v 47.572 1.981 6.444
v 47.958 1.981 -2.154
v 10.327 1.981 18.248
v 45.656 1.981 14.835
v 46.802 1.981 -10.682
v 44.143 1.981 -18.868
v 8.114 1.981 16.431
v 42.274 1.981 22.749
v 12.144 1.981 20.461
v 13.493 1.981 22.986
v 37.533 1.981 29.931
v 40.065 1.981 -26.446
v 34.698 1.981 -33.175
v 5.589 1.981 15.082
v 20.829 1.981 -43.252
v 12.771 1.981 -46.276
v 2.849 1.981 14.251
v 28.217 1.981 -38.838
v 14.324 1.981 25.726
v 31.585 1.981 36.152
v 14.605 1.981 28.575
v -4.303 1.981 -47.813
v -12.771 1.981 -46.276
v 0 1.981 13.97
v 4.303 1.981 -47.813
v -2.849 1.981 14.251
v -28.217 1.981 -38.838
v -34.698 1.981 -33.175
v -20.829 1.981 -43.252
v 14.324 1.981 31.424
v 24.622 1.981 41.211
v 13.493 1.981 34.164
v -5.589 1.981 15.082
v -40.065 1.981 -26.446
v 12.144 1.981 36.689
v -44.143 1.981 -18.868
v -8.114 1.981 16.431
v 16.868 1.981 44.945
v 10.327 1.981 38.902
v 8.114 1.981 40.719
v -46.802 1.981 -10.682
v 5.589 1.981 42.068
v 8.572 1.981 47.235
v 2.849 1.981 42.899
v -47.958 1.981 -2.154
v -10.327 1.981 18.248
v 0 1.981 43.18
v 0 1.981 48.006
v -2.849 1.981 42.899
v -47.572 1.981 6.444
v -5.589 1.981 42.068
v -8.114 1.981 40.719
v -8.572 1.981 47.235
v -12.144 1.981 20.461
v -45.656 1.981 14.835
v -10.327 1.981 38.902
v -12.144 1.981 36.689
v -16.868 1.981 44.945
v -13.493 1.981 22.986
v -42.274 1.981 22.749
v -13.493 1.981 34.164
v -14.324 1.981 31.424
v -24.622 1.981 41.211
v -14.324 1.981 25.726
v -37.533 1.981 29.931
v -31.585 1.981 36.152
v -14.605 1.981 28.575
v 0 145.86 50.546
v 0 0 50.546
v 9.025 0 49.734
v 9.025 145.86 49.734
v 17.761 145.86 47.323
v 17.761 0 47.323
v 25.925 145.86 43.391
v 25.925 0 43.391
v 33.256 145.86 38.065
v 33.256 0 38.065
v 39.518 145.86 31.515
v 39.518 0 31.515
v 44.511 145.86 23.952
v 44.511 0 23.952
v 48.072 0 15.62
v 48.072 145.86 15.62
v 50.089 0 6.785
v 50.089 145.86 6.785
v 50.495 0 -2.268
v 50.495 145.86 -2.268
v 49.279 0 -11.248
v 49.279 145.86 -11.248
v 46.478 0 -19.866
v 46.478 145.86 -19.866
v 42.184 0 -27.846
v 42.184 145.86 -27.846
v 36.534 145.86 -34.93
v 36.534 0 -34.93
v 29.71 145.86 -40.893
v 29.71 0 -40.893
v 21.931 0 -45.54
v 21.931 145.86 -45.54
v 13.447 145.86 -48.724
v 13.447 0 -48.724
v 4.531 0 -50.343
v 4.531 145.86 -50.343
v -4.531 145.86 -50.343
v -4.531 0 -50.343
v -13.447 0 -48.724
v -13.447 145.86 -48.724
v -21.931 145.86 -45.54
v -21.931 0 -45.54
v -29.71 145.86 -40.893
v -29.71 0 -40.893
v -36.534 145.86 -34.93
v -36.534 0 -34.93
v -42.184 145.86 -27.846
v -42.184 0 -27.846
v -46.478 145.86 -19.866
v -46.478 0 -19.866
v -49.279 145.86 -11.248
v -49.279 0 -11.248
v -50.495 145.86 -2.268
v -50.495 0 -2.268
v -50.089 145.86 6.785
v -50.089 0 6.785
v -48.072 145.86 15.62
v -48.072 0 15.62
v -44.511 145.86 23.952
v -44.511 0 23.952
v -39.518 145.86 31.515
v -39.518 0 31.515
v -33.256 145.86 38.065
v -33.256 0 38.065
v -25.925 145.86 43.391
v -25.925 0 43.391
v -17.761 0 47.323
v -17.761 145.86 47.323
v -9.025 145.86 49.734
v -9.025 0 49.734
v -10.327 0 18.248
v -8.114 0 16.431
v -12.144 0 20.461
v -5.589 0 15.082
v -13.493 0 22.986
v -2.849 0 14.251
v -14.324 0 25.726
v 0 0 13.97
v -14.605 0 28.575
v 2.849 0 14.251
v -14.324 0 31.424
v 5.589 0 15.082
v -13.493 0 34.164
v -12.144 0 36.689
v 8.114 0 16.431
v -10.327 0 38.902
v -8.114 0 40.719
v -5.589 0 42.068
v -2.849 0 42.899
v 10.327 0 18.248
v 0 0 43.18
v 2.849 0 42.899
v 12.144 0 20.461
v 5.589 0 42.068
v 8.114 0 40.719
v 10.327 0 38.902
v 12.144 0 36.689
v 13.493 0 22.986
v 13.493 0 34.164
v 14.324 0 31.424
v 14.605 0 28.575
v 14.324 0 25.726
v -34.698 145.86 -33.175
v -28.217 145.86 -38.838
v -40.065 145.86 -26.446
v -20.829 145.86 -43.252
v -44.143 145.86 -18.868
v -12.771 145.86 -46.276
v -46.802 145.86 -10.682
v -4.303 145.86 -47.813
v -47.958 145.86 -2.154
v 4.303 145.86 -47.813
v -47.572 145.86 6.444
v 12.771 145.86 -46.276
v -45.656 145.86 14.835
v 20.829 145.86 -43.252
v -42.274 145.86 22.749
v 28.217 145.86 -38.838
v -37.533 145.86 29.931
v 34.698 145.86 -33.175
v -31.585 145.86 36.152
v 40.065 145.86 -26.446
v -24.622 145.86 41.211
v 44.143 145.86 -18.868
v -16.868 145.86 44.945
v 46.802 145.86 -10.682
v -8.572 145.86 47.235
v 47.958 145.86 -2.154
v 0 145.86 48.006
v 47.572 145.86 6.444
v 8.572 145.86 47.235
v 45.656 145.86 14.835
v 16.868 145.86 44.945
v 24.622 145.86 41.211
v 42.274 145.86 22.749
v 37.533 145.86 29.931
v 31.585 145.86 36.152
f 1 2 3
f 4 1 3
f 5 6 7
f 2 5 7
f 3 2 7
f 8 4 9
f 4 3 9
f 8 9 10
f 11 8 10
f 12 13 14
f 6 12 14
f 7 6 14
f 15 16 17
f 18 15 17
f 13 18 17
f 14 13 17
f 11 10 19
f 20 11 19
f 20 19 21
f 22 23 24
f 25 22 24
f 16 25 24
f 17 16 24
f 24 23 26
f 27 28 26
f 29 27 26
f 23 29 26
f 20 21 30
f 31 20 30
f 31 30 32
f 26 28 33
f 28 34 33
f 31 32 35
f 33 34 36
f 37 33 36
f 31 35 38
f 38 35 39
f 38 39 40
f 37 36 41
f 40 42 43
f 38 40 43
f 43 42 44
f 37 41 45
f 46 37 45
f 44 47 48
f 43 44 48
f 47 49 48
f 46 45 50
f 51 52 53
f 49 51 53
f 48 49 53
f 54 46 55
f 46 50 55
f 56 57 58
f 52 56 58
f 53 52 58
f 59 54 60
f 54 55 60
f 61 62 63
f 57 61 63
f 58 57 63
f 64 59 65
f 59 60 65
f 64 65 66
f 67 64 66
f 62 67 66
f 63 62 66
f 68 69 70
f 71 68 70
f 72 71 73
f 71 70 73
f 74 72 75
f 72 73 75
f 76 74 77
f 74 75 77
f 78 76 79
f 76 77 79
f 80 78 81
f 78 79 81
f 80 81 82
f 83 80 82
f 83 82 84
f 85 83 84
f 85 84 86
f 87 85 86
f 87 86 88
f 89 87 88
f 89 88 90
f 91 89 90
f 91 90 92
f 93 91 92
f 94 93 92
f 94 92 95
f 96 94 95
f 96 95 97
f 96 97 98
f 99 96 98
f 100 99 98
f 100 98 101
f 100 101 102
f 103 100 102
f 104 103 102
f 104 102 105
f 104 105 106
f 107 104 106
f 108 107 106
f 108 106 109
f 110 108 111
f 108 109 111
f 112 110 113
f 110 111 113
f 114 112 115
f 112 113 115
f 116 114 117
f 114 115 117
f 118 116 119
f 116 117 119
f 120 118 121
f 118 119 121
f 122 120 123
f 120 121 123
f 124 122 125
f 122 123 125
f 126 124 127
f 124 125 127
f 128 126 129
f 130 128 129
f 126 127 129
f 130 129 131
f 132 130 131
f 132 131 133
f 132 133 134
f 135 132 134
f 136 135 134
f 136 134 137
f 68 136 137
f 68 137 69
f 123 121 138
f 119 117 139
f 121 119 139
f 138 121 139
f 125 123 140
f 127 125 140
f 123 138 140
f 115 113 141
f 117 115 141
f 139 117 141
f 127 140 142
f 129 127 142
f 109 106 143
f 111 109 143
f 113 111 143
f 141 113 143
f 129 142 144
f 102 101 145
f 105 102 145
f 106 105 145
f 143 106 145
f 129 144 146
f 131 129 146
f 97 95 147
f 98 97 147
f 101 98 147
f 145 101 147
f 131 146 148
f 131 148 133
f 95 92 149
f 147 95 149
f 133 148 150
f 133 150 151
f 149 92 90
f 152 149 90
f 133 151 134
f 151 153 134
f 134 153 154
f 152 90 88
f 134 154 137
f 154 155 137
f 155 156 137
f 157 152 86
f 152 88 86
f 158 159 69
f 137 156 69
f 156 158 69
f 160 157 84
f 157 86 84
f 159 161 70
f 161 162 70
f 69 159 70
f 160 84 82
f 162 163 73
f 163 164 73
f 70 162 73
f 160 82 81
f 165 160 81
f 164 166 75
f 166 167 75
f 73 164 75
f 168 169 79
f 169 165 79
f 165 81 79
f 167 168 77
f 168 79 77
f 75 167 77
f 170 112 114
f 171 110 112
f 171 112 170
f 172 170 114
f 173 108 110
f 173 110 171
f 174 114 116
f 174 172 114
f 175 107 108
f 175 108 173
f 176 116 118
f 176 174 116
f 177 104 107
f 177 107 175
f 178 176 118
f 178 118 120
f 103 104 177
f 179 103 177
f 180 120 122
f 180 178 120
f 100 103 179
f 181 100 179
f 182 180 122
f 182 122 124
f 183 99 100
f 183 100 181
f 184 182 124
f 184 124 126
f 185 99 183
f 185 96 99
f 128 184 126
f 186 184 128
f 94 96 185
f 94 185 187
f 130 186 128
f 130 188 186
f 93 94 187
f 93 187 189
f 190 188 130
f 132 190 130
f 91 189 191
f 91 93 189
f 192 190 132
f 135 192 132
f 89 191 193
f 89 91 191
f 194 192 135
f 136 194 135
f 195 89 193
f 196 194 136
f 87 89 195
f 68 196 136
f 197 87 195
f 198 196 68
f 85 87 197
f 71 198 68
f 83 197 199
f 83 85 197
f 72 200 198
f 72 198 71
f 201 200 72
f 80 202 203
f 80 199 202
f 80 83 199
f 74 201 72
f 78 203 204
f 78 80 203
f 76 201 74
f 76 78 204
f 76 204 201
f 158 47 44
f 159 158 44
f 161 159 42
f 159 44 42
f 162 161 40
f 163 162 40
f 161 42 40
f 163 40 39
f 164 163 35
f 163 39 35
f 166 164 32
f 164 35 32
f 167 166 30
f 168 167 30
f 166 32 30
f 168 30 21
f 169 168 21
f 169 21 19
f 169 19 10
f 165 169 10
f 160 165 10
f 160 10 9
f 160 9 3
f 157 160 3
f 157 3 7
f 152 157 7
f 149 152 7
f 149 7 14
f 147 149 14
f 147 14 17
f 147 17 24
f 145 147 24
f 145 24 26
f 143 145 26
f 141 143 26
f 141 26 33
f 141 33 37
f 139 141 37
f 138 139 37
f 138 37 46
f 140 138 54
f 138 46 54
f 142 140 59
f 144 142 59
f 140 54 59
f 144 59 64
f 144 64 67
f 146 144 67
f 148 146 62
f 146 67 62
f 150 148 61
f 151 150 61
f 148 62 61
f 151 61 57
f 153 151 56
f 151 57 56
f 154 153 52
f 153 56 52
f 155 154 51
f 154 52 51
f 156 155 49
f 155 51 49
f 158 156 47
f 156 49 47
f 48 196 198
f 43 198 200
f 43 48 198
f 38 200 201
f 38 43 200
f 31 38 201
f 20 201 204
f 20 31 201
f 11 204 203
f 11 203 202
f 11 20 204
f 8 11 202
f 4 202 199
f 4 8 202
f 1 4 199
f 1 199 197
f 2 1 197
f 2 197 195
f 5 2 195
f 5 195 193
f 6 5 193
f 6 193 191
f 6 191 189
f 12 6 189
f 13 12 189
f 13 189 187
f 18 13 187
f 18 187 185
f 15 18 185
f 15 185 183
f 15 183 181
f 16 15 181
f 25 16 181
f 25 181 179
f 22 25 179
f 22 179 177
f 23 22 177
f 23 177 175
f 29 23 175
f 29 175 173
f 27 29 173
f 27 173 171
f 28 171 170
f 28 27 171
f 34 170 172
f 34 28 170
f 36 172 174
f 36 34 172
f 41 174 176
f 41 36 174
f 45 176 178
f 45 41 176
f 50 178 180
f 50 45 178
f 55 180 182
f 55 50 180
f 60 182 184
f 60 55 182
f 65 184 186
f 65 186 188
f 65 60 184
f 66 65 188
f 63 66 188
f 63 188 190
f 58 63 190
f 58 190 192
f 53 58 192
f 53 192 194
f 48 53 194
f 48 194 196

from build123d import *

# Parameters (mm, degrees)
SKETCH1_R           = 50.546
SKETCH1_R_2         = 48.006
BOSS_EXTRUDE1_DEPTH = 145.8595
SKETCH2_R           = 50.546
BOSS_EXTRUDE2_DEPTH = 1.9812
SKETCH3_R           = 14.605
CUT_EXTRUDE1_DEPTH  = 161.657279458


with BuildPart() as part:
    # Sketch1 → Boss-Extrude1 (new body)
    with BuildSketch(Plane(origin=(0, 0, 0), x_dir=(1, 0, 0), z_dir=(0, 1, 0))):
        with Locations(Location((0, 0, 0), (0, 0, 270))):
            Circle(SKETCH1_R)
        with Locations(Location((0, 0, 0), (0, 0, 270))):
            Circle(SKETCH1_R_2, mode=Mode.SUBTRACT)
    extrude(amount=BOSS_EXTRUDE1_DEPTH)

    # Sketch2 → Boss-Extrude2 (add)
    with BuildSketch(Plane.XZ):
        with Locations(Location((0, 0, 0), (0, 0, 90))):
            Circle(SKETCH2_R)
    extrude(amount=-BOSS_EXTRUDE2_DEPTH)

    # Sketch3 → Cut-Extrude1 (cut, through all)
    with BuildSketch(Plane(origin=(0, 1.9812, 0), x_dir=(-1, 0, 0), z_dir=(0, 1, 0))):
        with Locations(Location((0, 28.575, 0), (0, 0, 90))):
            Circle(SKETCH3_R)
    extrude(amount=-CUT_EXTRUDE1_DEPTH, mode=Mode.SUBTRACT)


solid = part.part
